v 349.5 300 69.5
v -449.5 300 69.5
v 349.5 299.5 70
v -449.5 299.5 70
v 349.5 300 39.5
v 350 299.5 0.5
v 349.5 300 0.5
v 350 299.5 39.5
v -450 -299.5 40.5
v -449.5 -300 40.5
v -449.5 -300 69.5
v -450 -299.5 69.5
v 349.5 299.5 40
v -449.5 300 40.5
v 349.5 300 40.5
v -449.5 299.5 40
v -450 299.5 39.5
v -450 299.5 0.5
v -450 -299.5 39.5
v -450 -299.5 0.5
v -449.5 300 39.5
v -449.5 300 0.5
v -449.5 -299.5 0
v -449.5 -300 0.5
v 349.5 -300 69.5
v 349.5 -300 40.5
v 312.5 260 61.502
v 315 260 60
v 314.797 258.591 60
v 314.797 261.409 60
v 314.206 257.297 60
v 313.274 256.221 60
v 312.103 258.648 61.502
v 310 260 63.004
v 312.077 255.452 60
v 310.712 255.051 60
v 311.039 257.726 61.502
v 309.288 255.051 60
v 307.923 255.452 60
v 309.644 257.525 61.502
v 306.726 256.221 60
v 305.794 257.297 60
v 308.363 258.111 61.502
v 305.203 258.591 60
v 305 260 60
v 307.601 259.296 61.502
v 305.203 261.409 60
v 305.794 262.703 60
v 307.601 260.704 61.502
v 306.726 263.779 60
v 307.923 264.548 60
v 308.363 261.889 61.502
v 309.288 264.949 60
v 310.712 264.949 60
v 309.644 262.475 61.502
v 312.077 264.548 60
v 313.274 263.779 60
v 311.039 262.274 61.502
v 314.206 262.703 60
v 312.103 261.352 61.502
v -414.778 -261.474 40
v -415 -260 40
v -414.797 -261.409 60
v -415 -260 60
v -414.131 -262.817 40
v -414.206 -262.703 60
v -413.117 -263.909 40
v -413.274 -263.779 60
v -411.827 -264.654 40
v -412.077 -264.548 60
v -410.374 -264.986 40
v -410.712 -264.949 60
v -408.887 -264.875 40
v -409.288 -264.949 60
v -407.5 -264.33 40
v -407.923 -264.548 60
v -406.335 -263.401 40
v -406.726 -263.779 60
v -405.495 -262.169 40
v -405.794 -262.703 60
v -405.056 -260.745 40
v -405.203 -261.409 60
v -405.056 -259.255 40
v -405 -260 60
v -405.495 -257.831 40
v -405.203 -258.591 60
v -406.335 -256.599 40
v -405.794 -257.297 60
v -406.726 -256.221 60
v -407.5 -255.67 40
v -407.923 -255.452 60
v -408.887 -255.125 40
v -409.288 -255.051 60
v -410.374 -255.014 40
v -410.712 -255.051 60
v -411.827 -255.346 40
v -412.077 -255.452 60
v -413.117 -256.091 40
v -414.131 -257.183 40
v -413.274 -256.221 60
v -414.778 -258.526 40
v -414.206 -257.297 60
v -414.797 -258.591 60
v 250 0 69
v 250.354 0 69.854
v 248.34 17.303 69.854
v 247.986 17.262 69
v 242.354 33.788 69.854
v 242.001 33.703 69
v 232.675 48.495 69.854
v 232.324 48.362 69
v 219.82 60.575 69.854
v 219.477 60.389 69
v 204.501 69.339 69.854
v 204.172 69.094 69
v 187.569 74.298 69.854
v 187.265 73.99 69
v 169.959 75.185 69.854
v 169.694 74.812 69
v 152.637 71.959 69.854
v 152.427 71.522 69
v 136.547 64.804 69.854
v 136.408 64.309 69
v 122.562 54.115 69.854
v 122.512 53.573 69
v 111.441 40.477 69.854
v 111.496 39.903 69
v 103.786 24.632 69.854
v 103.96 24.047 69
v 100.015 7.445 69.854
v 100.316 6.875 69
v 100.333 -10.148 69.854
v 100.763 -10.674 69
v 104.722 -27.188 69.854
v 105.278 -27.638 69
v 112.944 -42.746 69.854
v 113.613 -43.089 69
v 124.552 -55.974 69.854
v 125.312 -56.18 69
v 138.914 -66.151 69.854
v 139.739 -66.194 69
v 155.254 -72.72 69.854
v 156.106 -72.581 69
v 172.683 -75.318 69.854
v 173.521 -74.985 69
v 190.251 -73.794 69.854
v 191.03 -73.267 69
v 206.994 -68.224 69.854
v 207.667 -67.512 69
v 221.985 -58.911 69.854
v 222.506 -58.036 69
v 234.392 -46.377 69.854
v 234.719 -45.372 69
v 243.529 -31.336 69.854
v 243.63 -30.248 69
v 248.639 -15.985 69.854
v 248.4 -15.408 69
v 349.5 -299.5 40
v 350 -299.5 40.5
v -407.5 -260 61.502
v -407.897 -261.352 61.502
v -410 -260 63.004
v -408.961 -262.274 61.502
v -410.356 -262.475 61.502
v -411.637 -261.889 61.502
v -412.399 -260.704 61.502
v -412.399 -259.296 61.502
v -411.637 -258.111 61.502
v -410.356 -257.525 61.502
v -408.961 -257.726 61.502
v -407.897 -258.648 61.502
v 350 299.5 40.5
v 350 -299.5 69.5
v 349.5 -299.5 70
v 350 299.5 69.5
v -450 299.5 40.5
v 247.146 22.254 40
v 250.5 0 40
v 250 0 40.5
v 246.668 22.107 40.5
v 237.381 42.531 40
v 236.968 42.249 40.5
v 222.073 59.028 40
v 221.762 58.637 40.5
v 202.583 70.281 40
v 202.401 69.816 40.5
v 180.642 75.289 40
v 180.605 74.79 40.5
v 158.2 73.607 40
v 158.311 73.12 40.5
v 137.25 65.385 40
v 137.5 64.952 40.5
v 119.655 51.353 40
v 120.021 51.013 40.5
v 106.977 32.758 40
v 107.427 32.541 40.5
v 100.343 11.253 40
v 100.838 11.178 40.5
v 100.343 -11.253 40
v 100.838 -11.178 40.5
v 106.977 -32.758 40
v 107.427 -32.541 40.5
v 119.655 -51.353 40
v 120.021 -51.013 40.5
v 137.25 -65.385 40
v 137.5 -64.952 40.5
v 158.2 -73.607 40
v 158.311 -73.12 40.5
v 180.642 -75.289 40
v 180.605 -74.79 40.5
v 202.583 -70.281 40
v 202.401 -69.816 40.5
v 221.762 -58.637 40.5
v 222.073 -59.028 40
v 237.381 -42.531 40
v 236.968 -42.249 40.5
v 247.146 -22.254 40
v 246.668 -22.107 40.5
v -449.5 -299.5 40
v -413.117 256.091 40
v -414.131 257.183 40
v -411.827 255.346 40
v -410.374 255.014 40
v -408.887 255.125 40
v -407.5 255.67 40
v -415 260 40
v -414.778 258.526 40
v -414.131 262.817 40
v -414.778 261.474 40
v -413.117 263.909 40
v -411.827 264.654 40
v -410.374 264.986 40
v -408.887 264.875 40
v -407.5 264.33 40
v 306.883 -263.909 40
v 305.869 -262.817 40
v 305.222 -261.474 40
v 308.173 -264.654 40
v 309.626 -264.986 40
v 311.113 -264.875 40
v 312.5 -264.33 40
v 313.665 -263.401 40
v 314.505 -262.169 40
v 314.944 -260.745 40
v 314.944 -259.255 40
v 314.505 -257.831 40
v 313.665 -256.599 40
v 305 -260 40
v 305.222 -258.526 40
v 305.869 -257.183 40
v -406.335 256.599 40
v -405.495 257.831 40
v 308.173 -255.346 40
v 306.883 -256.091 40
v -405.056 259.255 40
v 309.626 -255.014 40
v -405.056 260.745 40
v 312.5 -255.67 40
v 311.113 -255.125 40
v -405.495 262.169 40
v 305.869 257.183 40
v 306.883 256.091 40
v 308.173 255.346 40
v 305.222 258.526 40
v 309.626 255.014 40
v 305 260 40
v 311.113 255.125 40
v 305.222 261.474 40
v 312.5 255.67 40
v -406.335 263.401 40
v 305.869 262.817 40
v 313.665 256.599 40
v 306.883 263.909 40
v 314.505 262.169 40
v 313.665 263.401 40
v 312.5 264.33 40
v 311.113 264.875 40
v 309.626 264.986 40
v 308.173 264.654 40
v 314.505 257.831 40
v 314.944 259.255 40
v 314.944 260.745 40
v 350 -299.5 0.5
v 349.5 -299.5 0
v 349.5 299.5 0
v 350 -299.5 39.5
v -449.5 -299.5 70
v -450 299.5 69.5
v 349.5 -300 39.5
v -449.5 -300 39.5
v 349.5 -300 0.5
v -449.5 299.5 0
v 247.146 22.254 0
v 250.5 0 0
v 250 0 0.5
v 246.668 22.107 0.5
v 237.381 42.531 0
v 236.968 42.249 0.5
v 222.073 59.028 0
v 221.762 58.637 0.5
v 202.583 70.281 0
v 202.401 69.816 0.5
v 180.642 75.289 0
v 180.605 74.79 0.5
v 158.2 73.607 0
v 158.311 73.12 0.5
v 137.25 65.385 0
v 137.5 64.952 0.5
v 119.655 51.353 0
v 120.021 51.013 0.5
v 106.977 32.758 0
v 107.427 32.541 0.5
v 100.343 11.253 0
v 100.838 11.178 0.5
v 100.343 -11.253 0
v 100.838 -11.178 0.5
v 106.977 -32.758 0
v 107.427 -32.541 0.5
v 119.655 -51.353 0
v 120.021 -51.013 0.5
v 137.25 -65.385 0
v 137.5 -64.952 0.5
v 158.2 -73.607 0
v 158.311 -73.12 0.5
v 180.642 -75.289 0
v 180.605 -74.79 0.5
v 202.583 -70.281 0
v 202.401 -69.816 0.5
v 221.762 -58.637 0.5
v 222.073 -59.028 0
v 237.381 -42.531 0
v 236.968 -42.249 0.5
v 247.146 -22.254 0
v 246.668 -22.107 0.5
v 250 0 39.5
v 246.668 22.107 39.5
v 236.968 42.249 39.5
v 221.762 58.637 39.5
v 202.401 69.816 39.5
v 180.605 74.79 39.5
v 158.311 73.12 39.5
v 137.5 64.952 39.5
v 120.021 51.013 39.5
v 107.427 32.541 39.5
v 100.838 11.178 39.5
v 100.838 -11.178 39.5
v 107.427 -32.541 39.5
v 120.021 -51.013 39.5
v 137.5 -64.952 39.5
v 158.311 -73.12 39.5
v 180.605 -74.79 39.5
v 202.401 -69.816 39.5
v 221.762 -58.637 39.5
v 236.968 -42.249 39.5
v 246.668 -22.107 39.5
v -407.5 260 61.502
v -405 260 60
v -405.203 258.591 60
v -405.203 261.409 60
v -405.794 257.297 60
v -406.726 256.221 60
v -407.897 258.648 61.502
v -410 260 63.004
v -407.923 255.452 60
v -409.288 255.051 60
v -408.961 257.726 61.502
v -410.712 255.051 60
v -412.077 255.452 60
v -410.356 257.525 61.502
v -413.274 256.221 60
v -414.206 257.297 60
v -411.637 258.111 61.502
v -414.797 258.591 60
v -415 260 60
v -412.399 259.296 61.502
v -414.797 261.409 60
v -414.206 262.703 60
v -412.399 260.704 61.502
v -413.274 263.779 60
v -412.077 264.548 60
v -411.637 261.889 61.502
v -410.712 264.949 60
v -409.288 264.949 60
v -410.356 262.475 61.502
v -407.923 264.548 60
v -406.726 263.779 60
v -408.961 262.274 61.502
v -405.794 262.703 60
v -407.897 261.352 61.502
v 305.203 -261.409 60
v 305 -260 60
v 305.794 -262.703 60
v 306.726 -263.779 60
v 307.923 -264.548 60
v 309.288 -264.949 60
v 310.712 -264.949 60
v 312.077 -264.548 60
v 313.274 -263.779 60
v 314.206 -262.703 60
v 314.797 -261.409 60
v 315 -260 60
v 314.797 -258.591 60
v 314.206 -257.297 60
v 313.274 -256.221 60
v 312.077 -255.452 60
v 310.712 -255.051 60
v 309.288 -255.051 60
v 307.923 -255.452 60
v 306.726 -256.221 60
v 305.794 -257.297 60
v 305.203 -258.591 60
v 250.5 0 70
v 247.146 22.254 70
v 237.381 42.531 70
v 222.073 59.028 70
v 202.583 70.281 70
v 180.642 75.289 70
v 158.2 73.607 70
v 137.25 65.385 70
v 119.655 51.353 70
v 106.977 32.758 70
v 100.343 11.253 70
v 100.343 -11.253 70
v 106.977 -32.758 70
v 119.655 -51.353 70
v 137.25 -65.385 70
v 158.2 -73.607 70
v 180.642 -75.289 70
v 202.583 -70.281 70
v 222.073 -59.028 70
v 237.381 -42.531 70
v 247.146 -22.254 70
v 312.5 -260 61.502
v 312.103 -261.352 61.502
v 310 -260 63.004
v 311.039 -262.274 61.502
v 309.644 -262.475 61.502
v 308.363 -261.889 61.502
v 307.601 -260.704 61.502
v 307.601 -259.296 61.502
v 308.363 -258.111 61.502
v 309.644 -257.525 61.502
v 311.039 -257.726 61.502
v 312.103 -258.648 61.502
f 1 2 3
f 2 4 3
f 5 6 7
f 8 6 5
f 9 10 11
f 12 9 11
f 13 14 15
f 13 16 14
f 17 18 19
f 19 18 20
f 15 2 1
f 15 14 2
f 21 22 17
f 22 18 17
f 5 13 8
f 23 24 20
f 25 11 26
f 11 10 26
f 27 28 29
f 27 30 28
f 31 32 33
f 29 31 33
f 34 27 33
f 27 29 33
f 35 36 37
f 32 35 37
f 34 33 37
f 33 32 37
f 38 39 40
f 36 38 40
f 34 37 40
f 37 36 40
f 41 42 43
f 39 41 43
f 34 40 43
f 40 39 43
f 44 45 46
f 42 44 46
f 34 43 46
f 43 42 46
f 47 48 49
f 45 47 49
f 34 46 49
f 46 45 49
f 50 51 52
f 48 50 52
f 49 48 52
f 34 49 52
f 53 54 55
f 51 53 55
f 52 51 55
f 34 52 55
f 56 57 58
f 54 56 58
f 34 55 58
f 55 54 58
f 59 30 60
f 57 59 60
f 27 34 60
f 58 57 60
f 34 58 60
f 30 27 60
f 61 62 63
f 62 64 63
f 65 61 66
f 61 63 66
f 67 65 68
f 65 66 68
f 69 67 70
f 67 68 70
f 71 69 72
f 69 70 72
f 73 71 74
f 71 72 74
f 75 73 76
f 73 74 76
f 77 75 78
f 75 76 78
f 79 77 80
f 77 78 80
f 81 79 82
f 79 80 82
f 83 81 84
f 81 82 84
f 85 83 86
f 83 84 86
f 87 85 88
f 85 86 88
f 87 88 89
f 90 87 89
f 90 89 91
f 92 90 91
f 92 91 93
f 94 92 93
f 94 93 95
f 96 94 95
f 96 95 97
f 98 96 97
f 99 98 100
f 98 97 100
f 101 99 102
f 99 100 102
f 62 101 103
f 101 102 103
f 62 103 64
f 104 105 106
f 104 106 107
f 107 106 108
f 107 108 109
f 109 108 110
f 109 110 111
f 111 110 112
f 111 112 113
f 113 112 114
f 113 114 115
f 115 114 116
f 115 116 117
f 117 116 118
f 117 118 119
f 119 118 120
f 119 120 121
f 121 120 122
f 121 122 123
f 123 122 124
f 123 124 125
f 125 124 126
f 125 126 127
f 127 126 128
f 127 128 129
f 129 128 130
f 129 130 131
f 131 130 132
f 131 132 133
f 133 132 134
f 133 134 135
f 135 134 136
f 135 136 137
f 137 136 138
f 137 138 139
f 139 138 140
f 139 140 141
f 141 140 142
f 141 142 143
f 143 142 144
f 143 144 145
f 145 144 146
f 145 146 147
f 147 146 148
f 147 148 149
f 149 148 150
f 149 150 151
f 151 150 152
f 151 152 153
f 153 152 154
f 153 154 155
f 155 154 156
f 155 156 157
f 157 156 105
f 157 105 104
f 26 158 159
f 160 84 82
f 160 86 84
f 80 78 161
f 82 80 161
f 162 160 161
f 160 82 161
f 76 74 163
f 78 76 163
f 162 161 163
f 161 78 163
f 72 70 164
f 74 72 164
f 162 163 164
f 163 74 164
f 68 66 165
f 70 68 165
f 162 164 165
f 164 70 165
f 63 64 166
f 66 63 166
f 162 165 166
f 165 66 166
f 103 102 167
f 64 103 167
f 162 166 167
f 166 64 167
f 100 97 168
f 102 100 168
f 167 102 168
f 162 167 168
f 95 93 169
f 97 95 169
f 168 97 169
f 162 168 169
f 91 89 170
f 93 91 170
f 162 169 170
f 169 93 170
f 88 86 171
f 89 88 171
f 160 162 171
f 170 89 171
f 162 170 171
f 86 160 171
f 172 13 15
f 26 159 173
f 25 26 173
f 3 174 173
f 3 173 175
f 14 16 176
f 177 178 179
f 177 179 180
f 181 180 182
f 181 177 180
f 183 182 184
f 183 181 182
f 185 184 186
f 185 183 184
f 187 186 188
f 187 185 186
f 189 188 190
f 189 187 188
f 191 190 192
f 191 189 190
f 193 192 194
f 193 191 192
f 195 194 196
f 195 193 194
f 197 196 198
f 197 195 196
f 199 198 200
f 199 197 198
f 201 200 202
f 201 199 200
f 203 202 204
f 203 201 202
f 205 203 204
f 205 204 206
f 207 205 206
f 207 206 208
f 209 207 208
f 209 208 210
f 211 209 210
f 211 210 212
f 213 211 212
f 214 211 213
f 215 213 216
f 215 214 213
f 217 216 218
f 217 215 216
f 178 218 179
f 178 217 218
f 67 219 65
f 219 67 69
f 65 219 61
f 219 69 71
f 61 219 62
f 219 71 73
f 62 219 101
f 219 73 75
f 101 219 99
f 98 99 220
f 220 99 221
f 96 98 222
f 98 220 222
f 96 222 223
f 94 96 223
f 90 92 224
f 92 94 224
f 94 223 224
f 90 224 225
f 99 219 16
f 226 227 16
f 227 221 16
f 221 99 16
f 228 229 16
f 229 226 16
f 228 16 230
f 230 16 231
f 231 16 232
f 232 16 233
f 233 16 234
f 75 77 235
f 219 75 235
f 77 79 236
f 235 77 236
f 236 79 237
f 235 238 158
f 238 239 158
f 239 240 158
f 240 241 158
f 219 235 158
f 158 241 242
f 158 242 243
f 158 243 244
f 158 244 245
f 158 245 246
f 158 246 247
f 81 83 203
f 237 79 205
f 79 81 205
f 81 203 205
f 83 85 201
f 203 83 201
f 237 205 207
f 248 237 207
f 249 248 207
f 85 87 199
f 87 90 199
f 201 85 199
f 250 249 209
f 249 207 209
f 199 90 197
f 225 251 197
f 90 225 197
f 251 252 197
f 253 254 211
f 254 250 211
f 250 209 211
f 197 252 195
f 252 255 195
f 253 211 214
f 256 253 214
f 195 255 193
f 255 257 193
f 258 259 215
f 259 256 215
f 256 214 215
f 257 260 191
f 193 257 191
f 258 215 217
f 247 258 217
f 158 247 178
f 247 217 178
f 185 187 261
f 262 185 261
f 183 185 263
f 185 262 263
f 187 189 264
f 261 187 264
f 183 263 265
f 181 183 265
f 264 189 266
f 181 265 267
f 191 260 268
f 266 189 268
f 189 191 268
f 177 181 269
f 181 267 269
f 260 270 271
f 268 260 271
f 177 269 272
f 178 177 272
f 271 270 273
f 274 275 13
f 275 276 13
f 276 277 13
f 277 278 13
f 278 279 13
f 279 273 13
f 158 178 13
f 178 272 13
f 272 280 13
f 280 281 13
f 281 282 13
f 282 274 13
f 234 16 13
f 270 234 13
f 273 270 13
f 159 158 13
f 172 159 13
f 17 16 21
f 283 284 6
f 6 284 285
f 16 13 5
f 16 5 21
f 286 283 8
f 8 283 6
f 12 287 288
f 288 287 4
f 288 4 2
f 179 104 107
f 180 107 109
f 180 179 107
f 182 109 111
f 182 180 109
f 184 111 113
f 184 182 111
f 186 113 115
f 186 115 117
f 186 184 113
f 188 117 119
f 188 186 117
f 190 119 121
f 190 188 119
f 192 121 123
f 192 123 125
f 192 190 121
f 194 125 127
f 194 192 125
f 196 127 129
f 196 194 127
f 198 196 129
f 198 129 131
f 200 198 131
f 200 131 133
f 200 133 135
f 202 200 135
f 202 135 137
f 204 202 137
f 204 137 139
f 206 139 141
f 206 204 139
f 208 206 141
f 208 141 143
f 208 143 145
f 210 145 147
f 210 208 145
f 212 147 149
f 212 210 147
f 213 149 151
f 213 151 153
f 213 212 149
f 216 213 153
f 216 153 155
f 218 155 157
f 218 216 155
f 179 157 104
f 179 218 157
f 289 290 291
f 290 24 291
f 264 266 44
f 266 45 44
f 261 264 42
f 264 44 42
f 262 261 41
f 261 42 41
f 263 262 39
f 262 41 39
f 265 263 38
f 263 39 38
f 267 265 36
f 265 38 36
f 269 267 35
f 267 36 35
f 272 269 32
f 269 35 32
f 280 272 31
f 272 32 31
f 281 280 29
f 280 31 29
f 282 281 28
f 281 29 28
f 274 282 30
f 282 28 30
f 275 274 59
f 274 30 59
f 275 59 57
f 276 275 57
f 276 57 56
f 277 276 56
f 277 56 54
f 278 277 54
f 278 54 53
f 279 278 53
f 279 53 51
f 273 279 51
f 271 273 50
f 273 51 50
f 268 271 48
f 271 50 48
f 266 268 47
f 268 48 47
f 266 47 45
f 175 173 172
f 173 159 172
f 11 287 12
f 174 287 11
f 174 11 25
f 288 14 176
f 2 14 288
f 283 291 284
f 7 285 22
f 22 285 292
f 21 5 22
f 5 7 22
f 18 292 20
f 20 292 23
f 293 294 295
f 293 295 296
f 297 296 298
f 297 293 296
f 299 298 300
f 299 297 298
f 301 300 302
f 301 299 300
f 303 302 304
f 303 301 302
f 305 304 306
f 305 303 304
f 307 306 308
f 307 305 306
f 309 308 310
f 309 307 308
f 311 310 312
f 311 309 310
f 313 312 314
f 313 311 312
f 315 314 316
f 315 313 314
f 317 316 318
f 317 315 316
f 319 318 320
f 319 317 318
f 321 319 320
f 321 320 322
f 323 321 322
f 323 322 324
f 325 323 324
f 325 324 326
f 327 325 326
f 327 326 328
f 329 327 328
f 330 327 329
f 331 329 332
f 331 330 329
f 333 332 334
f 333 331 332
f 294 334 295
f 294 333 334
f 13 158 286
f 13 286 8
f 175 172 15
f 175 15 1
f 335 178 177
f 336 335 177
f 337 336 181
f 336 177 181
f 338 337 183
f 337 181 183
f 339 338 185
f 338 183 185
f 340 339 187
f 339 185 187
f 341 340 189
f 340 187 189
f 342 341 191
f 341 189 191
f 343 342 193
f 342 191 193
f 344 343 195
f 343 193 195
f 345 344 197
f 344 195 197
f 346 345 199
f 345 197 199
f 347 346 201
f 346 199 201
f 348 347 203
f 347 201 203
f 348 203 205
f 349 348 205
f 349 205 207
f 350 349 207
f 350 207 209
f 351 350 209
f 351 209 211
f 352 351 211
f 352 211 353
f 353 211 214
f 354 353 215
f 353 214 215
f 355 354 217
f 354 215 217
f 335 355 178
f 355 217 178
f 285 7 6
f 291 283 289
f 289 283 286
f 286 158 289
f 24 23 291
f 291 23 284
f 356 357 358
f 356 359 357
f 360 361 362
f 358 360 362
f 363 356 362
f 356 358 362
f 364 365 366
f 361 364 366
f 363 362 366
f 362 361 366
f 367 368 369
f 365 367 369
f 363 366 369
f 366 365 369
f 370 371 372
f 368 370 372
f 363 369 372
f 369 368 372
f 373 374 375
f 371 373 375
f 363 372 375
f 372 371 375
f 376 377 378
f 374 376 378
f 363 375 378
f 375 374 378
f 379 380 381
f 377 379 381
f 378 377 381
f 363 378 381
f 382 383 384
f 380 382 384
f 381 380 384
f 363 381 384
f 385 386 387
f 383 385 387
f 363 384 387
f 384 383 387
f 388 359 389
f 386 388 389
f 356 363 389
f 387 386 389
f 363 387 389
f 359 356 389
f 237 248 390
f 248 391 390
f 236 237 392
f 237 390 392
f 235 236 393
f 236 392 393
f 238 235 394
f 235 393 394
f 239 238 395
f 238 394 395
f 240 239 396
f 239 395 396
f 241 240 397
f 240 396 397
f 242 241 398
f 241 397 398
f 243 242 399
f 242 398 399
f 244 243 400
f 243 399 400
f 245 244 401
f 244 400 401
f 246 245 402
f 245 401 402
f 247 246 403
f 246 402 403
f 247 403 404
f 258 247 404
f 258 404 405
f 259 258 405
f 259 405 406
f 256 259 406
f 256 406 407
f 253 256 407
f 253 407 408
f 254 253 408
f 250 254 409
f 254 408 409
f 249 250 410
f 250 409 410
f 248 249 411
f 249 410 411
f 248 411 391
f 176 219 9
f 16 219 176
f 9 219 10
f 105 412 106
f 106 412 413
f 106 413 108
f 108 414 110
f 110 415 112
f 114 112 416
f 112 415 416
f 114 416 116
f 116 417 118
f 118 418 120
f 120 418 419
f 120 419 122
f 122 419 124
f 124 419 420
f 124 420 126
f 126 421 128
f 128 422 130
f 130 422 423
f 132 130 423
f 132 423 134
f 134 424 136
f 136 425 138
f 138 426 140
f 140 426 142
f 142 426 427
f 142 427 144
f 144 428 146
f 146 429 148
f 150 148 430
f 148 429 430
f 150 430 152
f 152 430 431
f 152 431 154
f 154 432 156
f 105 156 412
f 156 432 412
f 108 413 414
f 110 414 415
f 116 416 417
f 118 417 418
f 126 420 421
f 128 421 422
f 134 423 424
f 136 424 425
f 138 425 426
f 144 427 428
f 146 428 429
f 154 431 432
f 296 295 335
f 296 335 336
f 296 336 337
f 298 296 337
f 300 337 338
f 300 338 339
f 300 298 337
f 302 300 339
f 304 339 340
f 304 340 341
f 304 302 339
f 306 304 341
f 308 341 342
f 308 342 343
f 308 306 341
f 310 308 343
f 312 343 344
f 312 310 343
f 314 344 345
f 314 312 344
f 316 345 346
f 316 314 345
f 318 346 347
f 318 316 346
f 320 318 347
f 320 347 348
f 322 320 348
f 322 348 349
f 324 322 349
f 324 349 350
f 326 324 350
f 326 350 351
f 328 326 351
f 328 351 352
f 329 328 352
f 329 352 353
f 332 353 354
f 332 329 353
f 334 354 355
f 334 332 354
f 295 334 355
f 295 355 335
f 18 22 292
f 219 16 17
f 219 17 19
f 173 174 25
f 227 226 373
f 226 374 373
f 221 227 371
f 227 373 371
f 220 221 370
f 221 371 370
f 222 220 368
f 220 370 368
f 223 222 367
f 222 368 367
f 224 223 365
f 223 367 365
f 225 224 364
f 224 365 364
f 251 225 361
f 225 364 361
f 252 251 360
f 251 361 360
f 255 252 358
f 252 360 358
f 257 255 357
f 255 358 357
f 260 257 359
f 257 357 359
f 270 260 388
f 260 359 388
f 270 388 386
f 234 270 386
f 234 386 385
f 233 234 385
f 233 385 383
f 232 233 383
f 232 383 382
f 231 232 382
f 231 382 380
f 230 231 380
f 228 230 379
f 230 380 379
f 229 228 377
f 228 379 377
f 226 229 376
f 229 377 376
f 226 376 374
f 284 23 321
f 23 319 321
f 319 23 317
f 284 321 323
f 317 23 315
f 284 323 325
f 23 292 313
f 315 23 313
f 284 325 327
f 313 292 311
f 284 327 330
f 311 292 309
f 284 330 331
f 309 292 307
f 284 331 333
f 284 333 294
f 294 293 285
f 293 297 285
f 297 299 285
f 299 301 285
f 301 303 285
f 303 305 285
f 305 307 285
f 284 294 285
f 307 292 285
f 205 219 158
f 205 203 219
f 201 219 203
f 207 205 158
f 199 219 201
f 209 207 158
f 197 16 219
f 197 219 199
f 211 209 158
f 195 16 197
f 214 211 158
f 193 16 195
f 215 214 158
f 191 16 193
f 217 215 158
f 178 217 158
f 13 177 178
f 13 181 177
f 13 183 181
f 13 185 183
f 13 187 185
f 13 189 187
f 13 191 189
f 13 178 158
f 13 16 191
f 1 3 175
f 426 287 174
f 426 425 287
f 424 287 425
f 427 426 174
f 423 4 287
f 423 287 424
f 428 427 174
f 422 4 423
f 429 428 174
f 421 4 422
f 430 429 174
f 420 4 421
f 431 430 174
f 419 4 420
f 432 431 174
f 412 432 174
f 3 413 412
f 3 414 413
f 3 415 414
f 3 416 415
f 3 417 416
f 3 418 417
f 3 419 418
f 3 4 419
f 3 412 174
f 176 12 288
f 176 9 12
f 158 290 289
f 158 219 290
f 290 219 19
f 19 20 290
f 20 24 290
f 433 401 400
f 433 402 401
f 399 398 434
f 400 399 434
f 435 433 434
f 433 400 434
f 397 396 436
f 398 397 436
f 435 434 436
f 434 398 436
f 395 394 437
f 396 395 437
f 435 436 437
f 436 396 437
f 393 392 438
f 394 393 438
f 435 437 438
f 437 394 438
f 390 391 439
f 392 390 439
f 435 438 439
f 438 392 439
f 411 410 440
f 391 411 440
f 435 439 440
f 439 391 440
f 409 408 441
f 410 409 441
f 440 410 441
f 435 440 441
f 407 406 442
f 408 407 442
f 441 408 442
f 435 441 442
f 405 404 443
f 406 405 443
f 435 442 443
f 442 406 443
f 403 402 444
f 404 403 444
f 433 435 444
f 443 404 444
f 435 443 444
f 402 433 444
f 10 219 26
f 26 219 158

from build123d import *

# Parameters (mm, degrees)
F0_R      = 75
F1_DEPTH  = 40
F3_W      = 800
F3_H      = 600
F3_W_2    = 720
F3_H_2    = 520
F3_R      = 75
F4_DEPTH  = 30
F5_SIZE   = 0.5
F6_D      = 10
F6_DEPTH  = 20
F6_TIP    = 3.0043030951
F7_SIZE   = 0.5
F7_2_SIZE = 0.5


# Not quite as in the source:
# - a feature names something its author has since deleted; it is built from what else it names


with BuildPart() as f1:
    # F0 (on Top) → F1 (new body)
    with BuildSketch(Plane.XY):
        with BuildLine():
            Line((330, 75), (350, 75))
            Line((350, 75), (350, 300))
            Line((350, 300), (-450, 300))
            Line((-450, 300), (-450, 75))
            Line((-450, 75), (-430, 75))
            ThreePointArc((-430, 75), (-422.9289321881, 72.0710678119), (-420, 65))
            Line((-420, 65), (-420, 0))
            Line((-420, 0), (-420, -65))
            ThreePointArc((-420, -65), (-422.9289321881, -72.0710678119), (-430, -75))
            Line((-430, -75), (-450, -75))
            Line((-450, -75), (-450, -300))
            Line((-450, -300), (350, -300))
            Line((350, -300), (350, -75))
            Line((350, -75), (330, -75))
            ThreePointArc((330, -75), (322.9289321881, -72.0710678119), (320, -65))
            Line((320, -65), (320, 65))
            ThreePointArc((320, 65), (322.9289321881, 72.0710678119), (330, 75))
        make_face()
        with Locations((175, 0)):
            Circle(F0_R, mode=Mode.SUBTRACT)
        with BuildLine():
            Line((350, -75), (350, 75))
            Line((350, 75), (330, 75))
            ThreePointArc((330, 75), (322.9289321881, 72.0710678119), (320, 65))
            Line((320, 65), (320, -65))
            ThreePointArc((320, -65), (322.9289321881, -72.0710678119), (330, -75))
            Line((330, -75), (350, -75))
        make_face()
        with BuildLine():
            Line((-450, 0), (-450, -75))
            Line((-450, -75), (-430, -75))
            ThreePointArc((-430, -75), (-422.9289321881, -72.0710678119), (-420, -65))
            Line((-420, -65), (-420, 0))
            Line((-420, 0), (-450, 0))
        make_face()
        with BuildLine():
            Line((-430, 75), (-450, 75))
            Line((-450, 75), (-450, 0))
            Line((-450, 0), (-420, 0))
            Line((-420, 0), (-420, 65))
            ThreePointArc((-420, 65), (-422.9289321881, 72.0710678119), (-430, 75))
        make_face()
    extrude(amount=F1_DEPTH)

    # F7
    f7_edges = [f1.edges().sort_by_distance(p)[0] for p in [
        (-50, -300, 40),
        (350, 0, 40),
        (-50, 300, 40),
        (-450, 0, 40),
        (100, 0, 40),
        (-450, -300, 20),
        (350, -300, 20),
        (-50, -300, 0),
        (350, 300, 20),
        (-450, 300, 20),
        (-50, 300, 0),
        (350, 0, 0),
        (-450, 0, 0),
        (100, 0, 0),
    ]]
    chamfer(f7_edges, length=F7_SIZE)


with BuildPart() as f4:
    # F3 (on face) → F4 (new body)
    with BuildSketch(Plane.XY.offset(40)):
        with Locations((-50, 0)):
            Rectangle(F3_W, F3_H)
        with Locations((-50, 0)):
            Rectangle(F3_W_2, F3_H_2, mode=Mode.SUBTRACT)
        with Locations((-50, 0)):
            Rectangle(F3_W_2, F3_H_2)
        with Locations((175, 0)):
            Circle(F3_R, mode=Mode.SUBTRACT)
    extrude(amount=F4_DEPTH)

    # F5
    f5_edges = [f4.edges().sort_by_distance(p)[0] for p in [
        (-50, 300, 70),
        (-450, 0, 70),
        (-50, -300, 70),
        (350, 0, 70),
        (100, 0, 70),
        (-50, 300, 40),
        (-450, 0, 40),
        (-50, -300, 40),
        (350, 0, 40),
        (100, 0, 40),
        (350, 300, 55),
        (-450, 300, 55),
        (-450, -300, 55),
        (350, -300, 55),
    ]]
    chamfer(f5_edges, length=F5_SIZE)

    # F6
    with Locations(Plane(origin=(0, 0, 40), x_dir=(1, 0, 0), z_dir=(0, 0, -1))):
        with Locations((-410, -260), (310, -260), (310, 260), (-410, 260)):
            Hole(F6_D / 2, depth=F6_DEPTH)
            with Locations((0, 0, -(F6_DEPTH + F6_TIP / 2))):  # 118° drill point
                Cone(0, F6_D / 2, F6_TIP, mode=Mode.SUBTRACT)

    # F7#2
    f7_2_edges = [f4.edges().sort_by_distance(p)[0] for p in [
        (100, 0, 69.5),
    ]]
    chamfer(f7_2_edges, length=F7_2_SIZE)


solid = Compound([f1.part, f4.part])
